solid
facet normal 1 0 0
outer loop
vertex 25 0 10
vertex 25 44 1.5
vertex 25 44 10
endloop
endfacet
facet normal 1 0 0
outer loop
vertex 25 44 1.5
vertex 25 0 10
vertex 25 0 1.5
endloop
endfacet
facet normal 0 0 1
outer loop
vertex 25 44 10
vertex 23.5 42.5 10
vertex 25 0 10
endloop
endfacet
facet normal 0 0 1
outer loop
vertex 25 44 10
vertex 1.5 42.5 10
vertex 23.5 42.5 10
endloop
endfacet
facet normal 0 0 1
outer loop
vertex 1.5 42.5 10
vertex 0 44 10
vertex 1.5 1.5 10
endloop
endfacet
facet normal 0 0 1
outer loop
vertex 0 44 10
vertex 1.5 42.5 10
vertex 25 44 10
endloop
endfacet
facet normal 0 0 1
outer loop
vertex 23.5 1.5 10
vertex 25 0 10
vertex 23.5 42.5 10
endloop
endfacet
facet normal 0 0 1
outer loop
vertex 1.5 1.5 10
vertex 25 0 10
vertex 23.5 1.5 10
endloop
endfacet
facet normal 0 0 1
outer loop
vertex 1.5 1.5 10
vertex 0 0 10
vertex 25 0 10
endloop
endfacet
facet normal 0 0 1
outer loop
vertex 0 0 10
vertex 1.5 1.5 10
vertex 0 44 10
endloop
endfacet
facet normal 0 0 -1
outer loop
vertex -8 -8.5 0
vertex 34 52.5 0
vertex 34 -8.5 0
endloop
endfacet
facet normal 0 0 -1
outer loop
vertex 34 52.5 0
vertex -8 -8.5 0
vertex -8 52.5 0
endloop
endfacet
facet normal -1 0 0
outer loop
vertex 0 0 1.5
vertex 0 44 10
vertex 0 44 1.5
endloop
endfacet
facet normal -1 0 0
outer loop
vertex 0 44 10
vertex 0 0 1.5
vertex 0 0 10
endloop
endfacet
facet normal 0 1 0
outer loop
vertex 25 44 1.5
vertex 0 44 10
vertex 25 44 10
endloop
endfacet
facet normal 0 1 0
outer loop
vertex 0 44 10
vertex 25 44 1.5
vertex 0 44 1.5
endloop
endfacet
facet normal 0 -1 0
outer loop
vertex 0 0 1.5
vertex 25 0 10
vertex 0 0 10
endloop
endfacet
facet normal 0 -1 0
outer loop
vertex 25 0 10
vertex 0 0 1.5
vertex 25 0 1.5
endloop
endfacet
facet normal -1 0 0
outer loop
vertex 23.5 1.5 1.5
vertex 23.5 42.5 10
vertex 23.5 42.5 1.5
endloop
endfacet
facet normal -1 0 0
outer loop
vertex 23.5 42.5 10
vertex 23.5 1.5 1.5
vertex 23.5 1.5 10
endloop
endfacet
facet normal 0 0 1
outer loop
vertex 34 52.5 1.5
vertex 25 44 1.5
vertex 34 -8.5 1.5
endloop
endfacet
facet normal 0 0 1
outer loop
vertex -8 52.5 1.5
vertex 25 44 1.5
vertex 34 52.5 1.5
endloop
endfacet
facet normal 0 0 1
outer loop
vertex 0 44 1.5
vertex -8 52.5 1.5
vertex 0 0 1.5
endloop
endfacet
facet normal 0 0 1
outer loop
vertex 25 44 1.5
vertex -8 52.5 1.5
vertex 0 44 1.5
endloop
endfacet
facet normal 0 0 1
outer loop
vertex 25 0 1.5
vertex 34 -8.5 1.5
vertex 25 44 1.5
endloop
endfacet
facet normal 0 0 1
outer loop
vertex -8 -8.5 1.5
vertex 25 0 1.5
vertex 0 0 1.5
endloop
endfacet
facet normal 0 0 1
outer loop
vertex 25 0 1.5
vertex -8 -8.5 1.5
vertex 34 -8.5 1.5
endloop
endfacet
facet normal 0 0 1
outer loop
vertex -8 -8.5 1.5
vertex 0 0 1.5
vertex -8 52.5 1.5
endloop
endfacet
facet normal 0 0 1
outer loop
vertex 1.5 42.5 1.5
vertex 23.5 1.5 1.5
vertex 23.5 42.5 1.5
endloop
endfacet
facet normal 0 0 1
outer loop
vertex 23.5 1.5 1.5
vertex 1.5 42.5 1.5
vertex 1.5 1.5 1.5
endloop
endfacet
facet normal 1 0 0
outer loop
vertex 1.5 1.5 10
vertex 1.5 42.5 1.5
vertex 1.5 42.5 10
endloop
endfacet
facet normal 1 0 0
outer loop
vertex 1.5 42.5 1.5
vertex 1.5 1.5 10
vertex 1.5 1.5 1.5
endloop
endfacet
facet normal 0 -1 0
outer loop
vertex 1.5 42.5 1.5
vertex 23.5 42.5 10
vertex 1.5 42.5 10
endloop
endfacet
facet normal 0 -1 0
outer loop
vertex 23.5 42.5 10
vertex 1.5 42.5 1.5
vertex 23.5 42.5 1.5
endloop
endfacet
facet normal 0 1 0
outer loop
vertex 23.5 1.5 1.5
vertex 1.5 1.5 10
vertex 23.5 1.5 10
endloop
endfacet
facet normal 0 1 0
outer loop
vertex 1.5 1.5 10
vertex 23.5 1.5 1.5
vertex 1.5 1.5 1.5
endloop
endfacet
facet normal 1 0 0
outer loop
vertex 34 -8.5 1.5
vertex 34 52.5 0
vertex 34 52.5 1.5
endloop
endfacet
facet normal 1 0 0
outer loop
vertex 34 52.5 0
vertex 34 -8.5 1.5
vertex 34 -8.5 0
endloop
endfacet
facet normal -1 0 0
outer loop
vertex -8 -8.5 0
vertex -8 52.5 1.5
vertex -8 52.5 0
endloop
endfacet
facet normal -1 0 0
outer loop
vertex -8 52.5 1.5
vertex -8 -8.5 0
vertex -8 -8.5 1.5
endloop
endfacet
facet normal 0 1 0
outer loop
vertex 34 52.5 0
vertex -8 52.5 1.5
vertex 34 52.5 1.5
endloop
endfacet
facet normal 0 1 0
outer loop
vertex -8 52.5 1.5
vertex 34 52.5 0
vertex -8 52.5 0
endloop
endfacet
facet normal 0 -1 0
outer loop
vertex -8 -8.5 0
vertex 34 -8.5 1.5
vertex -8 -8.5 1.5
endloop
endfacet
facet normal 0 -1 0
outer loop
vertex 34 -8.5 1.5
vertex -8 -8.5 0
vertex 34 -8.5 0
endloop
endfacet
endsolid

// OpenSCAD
//---------------------------------------------------------------------------------------------
//-- Print of OpenBeam
//-- (c) Martin Korinek	m.ko@inode.at
//-- April-2015
//---------------------------------------------------------------------------------------------
//--
//---------------------------------------------------------------------------------------------

use <MCAD/fonts.scad>

//fragment minimum angle
  $fa=10.0;

//fragment minimum size
  $fs=0.2;
  
  
  HolzBreite = 22.0;
  HolzLaenge = 41.0;
  HalterDicke = 1.5;
  HalterHoehe =10.0;
  PlattenBreite = 20.0;

difference()
{
	//cube([70,90,1],center = true);
	cube([HolzBreite+2*HalterDicke,HolzLaenge+2*HalterDicke,HalterHoehe]);
	translate([HalterDicke,HalterDicke,HalterDicke])
    cube([HolzBreite,HolzLaenge,HalterHoehe-HalterDicke]);
	
}
translate([-HolzBreite/2+2*HalterDicke,-PlattenBreite/2+HalterDicke,0])
cube([HolzBreite+PlattenBreite,HolzLaenge+PlattenBreite,HalterDicke]);
